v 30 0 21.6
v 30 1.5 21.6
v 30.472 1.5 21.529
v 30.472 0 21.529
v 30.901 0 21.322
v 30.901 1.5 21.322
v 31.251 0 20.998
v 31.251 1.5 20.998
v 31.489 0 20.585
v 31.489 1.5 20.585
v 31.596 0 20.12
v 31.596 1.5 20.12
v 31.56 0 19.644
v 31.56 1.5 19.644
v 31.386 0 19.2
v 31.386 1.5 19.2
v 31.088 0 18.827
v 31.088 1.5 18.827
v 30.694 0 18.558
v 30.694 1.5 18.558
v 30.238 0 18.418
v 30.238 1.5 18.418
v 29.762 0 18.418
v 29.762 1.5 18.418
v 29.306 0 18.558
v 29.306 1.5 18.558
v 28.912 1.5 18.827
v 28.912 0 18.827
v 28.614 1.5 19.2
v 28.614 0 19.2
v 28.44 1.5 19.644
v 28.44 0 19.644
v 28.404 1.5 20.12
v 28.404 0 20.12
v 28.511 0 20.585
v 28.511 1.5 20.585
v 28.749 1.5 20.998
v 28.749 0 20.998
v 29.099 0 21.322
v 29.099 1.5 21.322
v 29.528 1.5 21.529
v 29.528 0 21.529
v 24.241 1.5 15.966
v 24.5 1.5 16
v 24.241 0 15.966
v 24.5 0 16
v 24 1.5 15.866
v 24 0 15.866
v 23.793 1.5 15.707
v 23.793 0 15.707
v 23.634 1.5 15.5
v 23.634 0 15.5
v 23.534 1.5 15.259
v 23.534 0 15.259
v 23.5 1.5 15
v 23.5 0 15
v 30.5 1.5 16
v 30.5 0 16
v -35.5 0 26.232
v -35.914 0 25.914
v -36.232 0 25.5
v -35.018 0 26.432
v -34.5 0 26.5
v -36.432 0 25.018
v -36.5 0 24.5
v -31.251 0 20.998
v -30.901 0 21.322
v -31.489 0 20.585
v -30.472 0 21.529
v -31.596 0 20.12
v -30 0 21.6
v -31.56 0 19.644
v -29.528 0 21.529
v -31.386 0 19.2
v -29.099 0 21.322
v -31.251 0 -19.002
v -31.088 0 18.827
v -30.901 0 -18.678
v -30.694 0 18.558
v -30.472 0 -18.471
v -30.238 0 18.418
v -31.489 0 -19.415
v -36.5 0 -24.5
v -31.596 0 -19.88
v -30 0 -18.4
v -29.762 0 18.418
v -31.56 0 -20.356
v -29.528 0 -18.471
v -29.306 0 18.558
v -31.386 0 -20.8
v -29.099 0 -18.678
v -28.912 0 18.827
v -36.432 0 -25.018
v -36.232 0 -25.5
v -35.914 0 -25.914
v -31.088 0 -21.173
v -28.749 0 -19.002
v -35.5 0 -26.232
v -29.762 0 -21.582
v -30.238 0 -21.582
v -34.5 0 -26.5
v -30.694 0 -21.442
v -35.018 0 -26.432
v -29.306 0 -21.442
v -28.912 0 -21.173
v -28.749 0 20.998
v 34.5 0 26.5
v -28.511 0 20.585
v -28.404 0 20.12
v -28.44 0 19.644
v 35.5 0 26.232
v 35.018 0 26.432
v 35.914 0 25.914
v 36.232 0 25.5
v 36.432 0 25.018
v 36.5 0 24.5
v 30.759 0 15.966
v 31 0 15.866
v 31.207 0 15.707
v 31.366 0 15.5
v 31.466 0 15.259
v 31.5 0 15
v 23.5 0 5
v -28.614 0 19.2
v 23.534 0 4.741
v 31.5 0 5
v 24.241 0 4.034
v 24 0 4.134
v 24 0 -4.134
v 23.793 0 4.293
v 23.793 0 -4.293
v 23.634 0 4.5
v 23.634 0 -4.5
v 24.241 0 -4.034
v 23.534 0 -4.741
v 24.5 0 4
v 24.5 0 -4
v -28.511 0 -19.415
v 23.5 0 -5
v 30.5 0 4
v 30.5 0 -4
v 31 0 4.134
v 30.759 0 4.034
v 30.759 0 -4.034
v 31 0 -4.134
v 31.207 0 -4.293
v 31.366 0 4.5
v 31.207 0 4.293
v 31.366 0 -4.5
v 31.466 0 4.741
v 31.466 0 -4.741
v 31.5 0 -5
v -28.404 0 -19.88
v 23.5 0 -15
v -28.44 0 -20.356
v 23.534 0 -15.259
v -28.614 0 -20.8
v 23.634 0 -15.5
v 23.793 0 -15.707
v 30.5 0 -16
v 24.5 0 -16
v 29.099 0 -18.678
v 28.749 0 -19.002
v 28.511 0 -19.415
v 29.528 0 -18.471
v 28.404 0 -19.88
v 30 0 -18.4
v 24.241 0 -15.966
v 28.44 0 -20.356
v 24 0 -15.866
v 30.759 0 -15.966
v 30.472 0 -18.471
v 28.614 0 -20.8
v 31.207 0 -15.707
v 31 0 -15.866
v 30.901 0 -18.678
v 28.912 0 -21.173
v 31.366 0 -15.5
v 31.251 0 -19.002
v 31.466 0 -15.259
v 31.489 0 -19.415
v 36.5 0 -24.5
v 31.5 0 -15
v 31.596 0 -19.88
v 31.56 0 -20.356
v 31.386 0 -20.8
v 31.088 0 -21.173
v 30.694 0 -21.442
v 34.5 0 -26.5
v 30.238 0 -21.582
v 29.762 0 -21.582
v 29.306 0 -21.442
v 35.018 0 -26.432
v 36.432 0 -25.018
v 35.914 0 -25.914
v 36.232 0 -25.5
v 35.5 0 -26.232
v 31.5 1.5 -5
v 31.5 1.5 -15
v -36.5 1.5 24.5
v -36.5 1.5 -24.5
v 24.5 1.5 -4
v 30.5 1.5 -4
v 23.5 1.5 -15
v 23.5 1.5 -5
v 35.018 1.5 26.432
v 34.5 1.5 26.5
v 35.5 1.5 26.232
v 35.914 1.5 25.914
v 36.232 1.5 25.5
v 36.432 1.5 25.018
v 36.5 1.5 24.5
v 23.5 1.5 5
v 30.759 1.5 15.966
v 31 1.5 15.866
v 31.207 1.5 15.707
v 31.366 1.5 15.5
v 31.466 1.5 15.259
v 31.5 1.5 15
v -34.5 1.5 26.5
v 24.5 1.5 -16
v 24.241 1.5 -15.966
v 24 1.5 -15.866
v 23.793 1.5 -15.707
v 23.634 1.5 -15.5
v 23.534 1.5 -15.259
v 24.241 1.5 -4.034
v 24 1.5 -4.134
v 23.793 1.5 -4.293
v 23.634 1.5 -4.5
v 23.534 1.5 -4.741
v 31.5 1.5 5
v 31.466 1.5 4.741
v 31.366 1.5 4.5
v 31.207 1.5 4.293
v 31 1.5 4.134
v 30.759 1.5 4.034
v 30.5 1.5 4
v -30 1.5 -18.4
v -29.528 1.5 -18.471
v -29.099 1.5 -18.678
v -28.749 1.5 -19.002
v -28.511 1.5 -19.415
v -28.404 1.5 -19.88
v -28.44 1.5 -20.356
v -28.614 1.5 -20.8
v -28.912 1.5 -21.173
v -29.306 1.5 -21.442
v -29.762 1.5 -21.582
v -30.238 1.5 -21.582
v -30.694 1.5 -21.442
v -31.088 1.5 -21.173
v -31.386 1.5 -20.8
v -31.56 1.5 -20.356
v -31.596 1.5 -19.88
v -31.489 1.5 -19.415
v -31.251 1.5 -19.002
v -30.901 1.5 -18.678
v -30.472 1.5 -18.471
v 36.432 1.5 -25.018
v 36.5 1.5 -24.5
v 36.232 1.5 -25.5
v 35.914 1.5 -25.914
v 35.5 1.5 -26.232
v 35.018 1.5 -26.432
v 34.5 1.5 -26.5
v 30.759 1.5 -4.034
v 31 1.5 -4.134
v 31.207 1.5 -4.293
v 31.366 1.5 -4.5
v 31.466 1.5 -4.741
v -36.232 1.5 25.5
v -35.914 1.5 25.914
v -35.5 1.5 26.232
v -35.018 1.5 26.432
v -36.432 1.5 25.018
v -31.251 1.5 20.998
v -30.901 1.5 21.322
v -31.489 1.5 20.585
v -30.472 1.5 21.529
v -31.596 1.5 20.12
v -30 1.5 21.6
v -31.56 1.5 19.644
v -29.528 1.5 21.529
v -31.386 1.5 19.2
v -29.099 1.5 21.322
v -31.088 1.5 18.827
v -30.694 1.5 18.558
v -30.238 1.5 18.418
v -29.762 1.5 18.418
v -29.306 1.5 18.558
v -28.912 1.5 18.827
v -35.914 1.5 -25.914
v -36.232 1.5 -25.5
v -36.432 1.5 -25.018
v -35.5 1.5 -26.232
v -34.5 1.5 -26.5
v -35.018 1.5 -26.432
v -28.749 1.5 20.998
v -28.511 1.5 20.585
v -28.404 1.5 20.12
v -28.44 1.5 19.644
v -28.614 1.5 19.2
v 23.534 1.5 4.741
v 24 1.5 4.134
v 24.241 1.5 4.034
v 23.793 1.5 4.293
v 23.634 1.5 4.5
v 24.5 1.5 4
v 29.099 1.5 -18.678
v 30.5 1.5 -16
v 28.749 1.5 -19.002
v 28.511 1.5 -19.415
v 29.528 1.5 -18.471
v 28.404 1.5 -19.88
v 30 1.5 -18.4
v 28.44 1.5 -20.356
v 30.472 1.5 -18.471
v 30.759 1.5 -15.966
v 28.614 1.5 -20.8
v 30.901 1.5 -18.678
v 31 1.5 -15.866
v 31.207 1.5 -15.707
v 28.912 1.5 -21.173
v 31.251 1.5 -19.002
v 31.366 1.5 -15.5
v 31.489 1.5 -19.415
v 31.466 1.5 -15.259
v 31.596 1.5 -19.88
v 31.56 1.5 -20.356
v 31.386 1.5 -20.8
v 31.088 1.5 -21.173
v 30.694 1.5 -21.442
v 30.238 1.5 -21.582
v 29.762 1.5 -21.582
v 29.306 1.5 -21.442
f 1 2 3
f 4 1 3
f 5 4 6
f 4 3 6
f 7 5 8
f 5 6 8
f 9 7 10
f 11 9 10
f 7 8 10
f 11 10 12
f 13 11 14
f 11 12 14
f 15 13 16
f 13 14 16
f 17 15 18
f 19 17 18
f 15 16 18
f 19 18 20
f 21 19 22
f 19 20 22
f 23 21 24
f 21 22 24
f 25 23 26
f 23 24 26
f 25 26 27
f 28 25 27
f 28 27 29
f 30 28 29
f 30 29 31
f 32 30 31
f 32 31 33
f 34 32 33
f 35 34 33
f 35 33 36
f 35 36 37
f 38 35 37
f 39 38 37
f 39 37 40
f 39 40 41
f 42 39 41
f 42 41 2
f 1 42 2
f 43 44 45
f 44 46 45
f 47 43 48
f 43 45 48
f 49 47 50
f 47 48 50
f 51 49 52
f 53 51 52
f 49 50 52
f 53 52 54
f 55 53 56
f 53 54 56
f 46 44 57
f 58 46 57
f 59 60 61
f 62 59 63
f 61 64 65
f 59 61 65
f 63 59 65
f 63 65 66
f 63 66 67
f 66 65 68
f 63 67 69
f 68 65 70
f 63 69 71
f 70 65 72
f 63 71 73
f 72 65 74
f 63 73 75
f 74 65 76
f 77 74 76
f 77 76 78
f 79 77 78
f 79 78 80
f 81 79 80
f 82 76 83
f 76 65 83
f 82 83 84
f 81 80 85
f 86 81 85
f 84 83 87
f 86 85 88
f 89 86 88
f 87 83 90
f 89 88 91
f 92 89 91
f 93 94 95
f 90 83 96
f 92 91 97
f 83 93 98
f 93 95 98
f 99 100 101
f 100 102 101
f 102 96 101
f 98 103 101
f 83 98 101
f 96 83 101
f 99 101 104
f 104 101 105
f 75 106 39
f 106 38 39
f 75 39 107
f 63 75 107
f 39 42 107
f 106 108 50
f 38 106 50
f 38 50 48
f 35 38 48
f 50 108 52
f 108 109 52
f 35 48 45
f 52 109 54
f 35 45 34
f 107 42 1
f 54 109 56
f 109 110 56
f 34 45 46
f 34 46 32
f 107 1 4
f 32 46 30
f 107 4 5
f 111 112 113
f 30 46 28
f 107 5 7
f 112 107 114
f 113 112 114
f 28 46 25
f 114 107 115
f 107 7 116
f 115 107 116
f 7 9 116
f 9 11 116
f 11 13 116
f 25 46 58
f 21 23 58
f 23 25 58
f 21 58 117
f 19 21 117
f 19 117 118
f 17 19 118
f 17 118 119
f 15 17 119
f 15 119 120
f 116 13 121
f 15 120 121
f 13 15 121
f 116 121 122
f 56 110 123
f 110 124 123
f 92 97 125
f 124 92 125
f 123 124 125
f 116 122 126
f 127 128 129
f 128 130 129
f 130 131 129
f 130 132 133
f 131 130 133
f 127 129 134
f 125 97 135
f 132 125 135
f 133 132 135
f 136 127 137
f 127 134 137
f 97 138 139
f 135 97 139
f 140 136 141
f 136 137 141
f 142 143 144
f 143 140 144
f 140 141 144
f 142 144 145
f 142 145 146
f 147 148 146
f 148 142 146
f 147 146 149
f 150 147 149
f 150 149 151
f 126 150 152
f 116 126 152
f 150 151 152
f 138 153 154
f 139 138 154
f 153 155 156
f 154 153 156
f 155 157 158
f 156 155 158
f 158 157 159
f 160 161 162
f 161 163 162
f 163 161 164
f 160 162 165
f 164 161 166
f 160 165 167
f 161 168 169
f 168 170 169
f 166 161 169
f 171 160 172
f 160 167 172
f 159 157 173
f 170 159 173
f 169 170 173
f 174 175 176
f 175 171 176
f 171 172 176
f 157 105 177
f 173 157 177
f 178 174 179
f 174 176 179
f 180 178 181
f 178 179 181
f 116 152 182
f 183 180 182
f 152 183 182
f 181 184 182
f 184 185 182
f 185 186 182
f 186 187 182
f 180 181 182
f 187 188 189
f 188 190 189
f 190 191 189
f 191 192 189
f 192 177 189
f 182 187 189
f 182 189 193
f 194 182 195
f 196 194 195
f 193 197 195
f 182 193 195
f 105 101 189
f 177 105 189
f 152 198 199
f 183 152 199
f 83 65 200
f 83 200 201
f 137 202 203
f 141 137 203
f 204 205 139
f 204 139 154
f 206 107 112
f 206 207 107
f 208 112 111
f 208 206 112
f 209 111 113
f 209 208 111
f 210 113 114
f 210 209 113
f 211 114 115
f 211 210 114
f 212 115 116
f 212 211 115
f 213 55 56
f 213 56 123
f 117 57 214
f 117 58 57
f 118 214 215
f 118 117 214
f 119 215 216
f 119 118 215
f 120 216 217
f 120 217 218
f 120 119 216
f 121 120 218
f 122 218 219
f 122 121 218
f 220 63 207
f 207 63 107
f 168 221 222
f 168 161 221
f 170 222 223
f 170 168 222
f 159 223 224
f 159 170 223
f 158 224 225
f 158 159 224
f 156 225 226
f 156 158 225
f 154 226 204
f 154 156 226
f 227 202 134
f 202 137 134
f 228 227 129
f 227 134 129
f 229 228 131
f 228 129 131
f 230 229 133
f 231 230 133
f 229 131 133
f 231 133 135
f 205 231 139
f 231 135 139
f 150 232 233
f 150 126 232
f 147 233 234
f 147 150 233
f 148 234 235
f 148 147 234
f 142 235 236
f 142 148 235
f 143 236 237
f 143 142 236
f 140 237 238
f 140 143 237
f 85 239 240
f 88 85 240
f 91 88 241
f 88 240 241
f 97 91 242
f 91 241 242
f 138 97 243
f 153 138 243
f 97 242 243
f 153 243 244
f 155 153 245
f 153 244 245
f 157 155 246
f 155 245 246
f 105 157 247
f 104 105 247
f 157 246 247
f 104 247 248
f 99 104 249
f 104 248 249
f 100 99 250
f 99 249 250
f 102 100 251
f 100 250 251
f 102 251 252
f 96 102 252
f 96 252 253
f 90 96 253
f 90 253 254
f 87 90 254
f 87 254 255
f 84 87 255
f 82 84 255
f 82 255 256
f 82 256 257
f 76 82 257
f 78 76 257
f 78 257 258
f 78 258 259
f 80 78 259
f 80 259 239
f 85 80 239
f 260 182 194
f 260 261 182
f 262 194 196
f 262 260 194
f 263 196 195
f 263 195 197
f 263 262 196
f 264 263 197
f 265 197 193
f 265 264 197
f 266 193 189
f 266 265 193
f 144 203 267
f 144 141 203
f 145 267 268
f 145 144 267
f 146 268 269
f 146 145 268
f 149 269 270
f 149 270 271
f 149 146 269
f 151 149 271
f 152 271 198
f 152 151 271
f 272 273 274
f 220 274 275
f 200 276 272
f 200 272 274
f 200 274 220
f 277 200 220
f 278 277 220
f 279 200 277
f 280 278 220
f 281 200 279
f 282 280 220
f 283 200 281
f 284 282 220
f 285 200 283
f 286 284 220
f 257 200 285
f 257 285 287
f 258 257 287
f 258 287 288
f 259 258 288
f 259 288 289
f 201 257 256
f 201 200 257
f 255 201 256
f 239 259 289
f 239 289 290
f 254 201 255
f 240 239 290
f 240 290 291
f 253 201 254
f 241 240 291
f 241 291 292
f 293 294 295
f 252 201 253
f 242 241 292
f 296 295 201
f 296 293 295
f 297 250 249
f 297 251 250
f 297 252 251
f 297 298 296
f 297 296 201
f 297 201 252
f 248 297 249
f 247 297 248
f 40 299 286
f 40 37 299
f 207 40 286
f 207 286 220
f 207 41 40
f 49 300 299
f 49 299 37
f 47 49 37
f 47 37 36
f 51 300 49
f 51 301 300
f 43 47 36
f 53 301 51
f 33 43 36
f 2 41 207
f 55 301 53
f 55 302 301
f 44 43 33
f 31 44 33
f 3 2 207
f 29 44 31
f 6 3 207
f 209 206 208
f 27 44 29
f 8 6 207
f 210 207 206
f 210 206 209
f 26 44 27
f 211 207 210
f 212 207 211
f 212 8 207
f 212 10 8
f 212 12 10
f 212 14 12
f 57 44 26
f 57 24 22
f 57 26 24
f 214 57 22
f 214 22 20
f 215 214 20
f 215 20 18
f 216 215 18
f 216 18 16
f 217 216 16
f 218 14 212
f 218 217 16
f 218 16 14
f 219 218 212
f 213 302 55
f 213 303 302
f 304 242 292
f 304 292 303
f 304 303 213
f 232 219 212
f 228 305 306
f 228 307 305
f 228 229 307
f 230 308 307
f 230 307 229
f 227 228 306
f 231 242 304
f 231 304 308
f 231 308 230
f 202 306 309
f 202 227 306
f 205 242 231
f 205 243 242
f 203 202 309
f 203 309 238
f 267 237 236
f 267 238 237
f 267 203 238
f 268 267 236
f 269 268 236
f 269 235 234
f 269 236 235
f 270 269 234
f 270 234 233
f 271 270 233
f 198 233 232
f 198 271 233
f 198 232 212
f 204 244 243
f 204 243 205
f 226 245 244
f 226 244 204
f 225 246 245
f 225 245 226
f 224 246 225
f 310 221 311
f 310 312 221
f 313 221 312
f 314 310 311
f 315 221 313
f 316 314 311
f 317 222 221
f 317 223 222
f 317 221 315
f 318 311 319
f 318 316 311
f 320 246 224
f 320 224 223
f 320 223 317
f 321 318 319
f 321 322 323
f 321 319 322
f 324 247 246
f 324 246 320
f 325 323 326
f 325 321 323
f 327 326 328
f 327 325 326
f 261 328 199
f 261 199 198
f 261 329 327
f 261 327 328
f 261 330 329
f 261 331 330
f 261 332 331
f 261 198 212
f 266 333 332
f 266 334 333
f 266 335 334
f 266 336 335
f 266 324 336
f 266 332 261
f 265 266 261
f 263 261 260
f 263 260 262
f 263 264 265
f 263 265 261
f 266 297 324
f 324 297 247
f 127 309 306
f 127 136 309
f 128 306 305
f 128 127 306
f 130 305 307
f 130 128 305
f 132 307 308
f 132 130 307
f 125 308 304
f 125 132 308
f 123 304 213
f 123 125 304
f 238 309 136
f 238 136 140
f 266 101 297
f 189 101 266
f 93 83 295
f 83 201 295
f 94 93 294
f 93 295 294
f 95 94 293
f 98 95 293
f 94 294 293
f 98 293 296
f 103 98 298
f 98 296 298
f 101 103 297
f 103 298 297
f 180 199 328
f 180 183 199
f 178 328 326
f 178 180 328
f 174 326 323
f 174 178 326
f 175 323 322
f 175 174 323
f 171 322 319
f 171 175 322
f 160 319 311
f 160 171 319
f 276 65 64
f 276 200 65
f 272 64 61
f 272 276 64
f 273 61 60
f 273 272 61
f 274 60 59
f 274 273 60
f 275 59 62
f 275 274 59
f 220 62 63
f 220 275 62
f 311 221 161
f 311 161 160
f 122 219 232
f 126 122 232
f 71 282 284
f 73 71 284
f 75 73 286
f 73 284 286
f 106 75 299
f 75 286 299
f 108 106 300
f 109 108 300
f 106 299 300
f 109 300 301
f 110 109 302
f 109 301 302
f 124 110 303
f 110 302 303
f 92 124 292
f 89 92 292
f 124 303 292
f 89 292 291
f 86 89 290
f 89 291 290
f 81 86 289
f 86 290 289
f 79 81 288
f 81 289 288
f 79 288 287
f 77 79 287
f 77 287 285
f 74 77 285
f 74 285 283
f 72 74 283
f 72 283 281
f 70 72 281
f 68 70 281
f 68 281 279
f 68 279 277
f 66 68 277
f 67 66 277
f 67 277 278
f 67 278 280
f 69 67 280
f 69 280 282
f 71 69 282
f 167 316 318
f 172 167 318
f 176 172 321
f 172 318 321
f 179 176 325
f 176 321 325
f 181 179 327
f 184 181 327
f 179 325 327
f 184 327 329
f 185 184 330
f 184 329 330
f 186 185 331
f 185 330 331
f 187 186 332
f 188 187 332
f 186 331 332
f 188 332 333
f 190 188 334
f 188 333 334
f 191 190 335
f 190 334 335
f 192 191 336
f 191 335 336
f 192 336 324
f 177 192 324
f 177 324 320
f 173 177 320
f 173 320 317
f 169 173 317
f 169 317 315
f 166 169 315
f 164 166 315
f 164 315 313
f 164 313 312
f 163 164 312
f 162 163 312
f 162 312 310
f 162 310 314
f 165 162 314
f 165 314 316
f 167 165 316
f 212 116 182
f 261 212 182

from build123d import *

# Parameters (mm, degrees)
SKETCH_1_W                     = 73
SKETCH_1_H                     = 53
EXTRUDE_1_DEPTH                = 1.5
FILLET_1_R                     = 2
SKETCH_2_R                     = 1.6
CUT_EXTRUDE_1_DEPTH            = 46.130366717
PATTERN_LINEAR_1_COUNT         = 2
PATTERN_LINEAR_1_PITCH         = 60
PATTERN_LINEAR_1_COUNT_DIR2    = 2
PATTERN_LINEAR_1_PITCH_DIR2    = 40
SKETCH_3_W                     = 8
SKETCH_3_H                     = 12
CUT_EXTRUDE_2_DEPTH            = 46.130366717
FILLET_2_R                     = 1
PATTERN_LINEAR_2_COUNT         = 2
PATTERN_LINEAR_2_PITCH         = 20
FILLET_2_OF_PATTERN_LINEAR_2_R = 1


with BuildPart() as part:
    # 草图1 → 凸台-拉伸1 (new body)
    with BuildSketch(Plane(origin=(0, 0, 0), x_dir=(1, 0, 0), z_dir=(0, 1, 0))):
        Rectangle(SKETCH_1_W, SKETCH_1_H)
    extrude(amount=EXTRUDE_1_DEPTH)

    # 圆角1
    fillet_1_edges = [part.edges().sort_by_distance(p)[0] for p in [
        (-36.5, 0.75, -26.5),
        (36.5, 0.75, -26.5),
        (36.5, 0.75, 26.5),
        (-36.5, 0.75, 26.5),
    ]]
    fillet(fillet_1_edges, radius=FILLET_1_R)

    # 草图2 → 切除-拉伸1 (cut, through all)
    with BuildSketch(Plane(origin=(0, 1.5, 0), x_dir=(1, 0, 0), z_dir=(0, 1, 0))):
        with Locations(Location((-30, 20, 0), (0, 0, 270))):
            Circle(SKETCH_2_R)
    cut_extrude_1 = extrude(amount=-CUT_EXTRUDE_1_DEPTH, mode=Mode.SUBTRACT)

    # 阵列(线性)1: Cut-Extrude 1 2 × 2
    with Locations(*[(i * PATTERN_LINEAR_1_PITCH, 0, j * PATTERN_LINEAR_1_PITCH_DIR2) for i in range(PATTERN_LINEAR_1_COUNT) for j in range(PATTERN_LINEAR_1_COUNT_DIR2) if (i, j) != (0, 0)]):
        add(cut_extrude_1, mode=Mode.SUBTRACT)

    # 草图3 → 切除-拉伸2 (cut, through all)
    with BuildSketch(Plane(origin=(0, 1.5, 0), x_dir=(1, 0, 0), z_dir=(0, 1, 0))):
        with Locations((27.5, 10)):
            Rectangle(SKETCH_3_W, SKETCH_3_H)
    cut_extrude_2 = extrude(amount=-CUT_EXTRUDE_2_DEPTH, mode=Mode.SUBTRACT)

    # 圆角2
    fillet_2_edges = [part.edges().sort_by_distance(p)[0] for p in [
        (23.5, 0.75, -4),
        (23.5, 0.75, -16),
        (31.5, 0.75, -16),
        (31.5, 0.75, -4),
    ]]
    fillet(fillet_2_edges, radius=FILLET_2_R)

    # 阵列(线性)2: 切除-拉伸2 ×2
    with Locations(*[(0, 0, i * PATTERN_LINEAR_2_PITCH) for i in range(1, PATTERN_LINEAR_2_COUNT)]):
        add(cut_extrude_2, mode=Mode.SUBTRACT)

    # 圆角2 of 阵列(线性)2
    fillet_2_of_pattern_linear_2_edges = [part.edges().sort_by_distance(p)[0] for p in [
        (23.5, 0.75, 16),
        (23.5, 0.75, 4),
        (31.5, 0.75, 4),
        (31.5, 0.75, 16),
    ]]
    fillet(fillet_2_of_pattern_linear_2_edges, radius=FILLET_2_OF_PATTERN_LINEAR_2_R)


solid = part.part
